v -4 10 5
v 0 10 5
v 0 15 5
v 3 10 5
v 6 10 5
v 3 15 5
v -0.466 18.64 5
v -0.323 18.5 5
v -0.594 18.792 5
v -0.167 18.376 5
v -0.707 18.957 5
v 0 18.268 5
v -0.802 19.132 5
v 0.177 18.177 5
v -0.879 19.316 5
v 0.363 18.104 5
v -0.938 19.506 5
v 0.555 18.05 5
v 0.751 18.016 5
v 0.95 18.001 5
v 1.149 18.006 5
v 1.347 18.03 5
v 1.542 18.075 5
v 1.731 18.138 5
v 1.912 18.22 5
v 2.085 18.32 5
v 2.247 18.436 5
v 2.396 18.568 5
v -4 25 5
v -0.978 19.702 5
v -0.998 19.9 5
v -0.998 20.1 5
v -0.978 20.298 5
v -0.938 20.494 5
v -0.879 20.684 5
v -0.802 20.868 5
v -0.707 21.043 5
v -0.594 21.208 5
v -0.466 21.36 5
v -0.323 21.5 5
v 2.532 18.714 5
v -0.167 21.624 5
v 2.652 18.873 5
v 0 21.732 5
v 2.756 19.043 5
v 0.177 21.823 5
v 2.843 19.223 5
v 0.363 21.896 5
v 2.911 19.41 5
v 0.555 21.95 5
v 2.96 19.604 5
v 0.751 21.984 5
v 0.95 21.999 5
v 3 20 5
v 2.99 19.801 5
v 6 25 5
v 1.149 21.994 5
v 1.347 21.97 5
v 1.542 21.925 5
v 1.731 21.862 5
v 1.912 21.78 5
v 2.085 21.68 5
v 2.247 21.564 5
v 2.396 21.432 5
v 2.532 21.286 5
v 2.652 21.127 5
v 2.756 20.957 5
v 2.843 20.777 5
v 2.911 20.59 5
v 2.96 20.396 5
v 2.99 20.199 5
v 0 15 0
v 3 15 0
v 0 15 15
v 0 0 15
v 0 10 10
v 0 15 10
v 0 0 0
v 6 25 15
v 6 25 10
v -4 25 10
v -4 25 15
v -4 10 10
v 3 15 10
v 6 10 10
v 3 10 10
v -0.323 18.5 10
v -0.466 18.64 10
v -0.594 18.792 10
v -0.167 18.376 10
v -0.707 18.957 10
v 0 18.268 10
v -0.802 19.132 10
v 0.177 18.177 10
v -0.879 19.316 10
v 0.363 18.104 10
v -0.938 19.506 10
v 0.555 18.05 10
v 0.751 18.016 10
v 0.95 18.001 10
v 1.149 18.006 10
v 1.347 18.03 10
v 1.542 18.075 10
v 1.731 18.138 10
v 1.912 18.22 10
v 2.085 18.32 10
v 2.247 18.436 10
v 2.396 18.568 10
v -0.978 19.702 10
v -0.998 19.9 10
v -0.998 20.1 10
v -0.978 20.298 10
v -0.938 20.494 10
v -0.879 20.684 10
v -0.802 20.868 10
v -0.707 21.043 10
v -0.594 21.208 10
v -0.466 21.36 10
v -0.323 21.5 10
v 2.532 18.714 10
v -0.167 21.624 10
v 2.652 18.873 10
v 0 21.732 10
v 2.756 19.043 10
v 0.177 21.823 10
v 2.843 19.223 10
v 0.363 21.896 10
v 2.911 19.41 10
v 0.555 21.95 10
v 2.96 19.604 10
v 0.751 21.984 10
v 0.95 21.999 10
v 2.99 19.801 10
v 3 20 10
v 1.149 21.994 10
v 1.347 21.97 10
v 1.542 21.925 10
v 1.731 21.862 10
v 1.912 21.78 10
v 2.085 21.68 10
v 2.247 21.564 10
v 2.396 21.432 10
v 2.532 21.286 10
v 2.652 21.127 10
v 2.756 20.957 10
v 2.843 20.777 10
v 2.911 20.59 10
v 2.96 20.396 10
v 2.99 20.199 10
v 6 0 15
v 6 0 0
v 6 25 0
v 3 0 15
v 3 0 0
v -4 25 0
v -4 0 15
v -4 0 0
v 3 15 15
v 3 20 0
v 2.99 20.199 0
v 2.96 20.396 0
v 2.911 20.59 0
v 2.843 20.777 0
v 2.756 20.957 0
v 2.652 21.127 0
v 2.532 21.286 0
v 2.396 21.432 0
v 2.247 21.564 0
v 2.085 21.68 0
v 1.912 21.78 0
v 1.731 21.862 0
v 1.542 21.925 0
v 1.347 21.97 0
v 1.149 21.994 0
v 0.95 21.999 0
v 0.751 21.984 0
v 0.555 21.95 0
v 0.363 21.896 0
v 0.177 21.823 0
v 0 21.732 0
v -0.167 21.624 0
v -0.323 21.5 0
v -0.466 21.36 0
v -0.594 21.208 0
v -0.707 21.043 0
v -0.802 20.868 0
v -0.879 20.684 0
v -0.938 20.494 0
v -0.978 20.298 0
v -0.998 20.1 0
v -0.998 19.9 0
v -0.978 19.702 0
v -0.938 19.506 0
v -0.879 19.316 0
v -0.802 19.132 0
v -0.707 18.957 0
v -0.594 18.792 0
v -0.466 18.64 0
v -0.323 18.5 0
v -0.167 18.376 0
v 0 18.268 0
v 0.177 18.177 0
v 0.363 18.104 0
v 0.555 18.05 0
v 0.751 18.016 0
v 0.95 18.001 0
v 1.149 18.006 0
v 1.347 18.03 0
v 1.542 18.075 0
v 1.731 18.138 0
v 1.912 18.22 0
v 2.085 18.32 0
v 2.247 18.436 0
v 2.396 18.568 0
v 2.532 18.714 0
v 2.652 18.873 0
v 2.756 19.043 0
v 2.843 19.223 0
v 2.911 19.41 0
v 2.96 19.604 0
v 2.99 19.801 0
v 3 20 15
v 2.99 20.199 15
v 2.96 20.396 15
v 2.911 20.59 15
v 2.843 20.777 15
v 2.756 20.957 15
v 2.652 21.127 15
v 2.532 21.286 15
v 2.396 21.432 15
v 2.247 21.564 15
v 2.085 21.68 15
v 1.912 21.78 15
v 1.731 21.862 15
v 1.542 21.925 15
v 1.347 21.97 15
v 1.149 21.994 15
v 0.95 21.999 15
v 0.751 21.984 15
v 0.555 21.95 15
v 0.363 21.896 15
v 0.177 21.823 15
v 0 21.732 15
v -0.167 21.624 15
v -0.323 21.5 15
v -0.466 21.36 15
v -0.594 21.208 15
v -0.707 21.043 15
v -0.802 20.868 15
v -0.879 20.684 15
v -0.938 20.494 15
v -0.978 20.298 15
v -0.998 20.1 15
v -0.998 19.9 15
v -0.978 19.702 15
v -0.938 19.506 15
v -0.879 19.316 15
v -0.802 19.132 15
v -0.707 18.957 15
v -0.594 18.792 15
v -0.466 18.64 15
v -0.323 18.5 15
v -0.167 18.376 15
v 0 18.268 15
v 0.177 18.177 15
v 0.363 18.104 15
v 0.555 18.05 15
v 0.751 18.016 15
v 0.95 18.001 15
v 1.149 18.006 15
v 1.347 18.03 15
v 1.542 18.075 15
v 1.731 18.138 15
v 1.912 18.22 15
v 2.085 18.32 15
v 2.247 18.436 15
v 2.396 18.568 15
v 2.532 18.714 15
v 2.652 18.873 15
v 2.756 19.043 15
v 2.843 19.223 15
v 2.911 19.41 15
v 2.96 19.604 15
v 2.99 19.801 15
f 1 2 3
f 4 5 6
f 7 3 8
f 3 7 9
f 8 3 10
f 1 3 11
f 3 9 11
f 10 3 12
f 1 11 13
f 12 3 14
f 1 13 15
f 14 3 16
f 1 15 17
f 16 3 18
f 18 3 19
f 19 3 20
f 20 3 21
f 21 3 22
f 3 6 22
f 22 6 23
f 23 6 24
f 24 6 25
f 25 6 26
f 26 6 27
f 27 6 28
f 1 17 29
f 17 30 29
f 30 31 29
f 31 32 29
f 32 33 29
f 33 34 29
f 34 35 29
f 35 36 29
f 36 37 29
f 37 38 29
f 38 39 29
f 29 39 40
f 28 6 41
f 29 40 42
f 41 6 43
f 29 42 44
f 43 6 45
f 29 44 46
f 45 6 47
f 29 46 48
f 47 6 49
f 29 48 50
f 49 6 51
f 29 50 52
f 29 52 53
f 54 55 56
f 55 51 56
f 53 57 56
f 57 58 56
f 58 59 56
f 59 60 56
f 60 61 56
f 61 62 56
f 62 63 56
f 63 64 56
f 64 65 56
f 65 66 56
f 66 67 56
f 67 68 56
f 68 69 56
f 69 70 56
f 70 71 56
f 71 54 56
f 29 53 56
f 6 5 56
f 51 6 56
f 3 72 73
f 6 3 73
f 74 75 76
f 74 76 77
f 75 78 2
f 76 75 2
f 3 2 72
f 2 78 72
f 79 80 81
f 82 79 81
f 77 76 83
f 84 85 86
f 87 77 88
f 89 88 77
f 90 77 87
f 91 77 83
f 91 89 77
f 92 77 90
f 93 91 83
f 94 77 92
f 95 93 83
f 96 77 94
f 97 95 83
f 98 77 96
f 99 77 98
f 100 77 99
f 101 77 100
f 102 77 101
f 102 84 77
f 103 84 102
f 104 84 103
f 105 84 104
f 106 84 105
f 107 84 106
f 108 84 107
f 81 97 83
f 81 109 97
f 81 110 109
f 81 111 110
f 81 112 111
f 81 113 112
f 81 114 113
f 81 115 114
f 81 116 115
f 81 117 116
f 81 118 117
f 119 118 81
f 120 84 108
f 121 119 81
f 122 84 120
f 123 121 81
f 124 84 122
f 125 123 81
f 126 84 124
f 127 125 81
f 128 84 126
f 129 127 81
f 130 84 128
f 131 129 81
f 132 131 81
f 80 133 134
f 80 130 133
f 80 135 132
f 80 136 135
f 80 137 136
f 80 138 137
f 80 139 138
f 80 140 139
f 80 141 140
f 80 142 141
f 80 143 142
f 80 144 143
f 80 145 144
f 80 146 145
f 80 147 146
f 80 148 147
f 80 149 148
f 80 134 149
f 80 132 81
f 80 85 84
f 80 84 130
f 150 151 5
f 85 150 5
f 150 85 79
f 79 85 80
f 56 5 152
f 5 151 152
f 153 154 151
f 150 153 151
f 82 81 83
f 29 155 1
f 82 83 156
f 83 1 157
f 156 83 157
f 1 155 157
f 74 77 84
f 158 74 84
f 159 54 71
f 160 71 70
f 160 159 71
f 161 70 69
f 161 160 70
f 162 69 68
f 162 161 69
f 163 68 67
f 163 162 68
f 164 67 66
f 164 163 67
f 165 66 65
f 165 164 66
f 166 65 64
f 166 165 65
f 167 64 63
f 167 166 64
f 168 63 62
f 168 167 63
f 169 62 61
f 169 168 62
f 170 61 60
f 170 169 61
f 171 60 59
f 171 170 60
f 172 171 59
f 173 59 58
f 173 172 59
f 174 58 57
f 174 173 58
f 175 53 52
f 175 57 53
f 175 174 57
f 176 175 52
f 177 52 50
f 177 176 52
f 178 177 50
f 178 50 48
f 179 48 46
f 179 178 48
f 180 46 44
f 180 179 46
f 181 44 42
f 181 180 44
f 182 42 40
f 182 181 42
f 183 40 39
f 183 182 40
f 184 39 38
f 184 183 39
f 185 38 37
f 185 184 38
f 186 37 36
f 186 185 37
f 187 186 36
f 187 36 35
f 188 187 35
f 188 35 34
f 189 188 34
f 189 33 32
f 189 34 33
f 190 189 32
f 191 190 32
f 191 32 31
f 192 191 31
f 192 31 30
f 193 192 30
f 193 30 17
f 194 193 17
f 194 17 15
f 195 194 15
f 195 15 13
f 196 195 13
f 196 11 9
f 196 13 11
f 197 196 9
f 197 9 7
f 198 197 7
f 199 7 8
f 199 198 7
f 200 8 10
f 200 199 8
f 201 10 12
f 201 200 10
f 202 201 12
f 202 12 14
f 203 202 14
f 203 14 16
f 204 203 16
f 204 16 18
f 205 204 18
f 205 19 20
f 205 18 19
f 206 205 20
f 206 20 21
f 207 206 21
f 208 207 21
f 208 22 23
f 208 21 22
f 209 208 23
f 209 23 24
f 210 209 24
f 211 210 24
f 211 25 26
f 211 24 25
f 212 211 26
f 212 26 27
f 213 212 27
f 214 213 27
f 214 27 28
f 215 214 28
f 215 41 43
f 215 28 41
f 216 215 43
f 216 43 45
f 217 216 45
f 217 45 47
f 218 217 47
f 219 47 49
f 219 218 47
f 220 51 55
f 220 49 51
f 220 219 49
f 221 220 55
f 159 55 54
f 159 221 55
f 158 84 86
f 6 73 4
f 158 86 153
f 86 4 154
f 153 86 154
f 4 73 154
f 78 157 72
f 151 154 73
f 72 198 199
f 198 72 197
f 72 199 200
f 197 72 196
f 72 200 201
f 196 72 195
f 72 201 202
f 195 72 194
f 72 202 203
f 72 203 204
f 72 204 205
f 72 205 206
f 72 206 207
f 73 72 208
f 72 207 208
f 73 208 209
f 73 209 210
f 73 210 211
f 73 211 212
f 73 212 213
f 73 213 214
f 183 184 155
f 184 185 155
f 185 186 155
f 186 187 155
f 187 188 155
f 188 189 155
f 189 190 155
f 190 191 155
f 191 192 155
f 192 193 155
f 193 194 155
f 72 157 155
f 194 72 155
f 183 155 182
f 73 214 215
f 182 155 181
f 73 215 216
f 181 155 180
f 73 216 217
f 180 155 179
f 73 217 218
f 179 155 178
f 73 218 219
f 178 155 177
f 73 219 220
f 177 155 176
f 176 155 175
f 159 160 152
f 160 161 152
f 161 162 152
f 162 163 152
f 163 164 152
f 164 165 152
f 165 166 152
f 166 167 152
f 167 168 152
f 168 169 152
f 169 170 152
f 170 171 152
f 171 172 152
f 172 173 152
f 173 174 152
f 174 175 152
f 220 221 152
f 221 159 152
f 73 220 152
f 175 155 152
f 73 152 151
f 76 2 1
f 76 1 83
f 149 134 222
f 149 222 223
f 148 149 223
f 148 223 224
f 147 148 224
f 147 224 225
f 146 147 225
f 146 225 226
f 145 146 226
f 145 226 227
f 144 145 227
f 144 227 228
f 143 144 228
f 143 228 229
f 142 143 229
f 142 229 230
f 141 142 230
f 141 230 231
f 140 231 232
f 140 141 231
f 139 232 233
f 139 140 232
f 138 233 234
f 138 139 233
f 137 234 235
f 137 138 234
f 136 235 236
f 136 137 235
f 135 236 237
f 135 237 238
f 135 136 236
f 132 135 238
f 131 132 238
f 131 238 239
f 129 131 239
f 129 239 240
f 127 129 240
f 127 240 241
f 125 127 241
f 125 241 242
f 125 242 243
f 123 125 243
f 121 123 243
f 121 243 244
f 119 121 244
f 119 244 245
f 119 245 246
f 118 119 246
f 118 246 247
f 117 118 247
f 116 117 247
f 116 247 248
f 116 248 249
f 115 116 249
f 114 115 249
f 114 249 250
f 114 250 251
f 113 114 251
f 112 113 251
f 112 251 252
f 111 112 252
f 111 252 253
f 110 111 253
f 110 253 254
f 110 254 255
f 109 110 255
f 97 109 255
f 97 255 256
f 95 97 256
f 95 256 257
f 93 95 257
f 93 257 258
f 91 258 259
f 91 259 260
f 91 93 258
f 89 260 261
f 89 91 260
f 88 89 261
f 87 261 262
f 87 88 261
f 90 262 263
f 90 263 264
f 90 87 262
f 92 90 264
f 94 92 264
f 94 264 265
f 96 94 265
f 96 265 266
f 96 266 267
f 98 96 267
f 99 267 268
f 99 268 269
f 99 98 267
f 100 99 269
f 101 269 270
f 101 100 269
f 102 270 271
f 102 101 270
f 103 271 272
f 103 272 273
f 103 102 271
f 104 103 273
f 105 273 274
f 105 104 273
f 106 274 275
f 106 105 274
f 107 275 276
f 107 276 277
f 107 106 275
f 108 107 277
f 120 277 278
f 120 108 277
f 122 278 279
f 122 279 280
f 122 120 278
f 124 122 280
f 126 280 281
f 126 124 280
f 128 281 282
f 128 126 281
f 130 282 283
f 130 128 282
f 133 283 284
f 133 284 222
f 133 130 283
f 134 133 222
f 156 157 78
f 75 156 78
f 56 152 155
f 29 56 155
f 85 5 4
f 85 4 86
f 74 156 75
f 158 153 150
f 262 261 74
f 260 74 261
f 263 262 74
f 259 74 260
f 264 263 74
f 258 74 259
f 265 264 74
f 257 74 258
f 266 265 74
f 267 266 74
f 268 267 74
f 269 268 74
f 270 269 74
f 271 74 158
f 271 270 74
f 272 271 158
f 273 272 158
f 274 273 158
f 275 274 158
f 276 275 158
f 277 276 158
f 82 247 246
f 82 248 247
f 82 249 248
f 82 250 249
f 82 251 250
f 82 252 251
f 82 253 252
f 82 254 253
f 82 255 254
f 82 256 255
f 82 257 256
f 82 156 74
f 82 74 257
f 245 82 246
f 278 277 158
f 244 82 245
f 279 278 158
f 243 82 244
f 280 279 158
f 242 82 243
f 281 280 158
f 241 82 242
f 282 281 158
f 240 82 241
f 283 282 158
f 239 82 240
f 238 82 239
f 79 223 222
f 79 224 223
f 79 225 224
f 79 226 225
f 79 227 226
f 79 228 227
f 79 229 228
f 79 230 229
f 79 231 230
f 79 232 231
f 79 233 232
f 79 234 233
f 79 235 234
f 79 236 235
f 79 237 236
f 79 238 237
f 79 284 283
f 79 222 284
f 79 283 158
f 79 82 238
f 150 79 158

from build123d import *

# Parameters (mm, degrees)
F0_R     = 2
F1_DEPTH = 15
F2_W     = 15
F2_H     = 5
F3_DEPTH = 25.4


# Not quite as in the source:
# - a feature names something its author has since deleted; it is built from what else it names


with BuildPart() as f1:
    # F0 (on Top) → F1 (new body)
    with BuildSketch(Plane.XY):
        Polygon((-4, 0), (0, 0), (0, 15), (3, 15), (3, 0), (6, 0), (6, 25), (-4, 25), align=None)
        with Locations((1, 20)):
            Circle(F0_R, mode=Mode.SUBTRACT)
    extrude(amount=F1_DEPTH)

    # F2 (on face) → F3 (cut)
    with BuildSketch(Plane.YZ.offset(6)):
        with Locations((17.5, 7.5)):
            Rectangle(F2_W, F2_H)
    extrude(amount=-F3_DEPTH, mode=Mode.SUBTRACT)


solid = f1.part
